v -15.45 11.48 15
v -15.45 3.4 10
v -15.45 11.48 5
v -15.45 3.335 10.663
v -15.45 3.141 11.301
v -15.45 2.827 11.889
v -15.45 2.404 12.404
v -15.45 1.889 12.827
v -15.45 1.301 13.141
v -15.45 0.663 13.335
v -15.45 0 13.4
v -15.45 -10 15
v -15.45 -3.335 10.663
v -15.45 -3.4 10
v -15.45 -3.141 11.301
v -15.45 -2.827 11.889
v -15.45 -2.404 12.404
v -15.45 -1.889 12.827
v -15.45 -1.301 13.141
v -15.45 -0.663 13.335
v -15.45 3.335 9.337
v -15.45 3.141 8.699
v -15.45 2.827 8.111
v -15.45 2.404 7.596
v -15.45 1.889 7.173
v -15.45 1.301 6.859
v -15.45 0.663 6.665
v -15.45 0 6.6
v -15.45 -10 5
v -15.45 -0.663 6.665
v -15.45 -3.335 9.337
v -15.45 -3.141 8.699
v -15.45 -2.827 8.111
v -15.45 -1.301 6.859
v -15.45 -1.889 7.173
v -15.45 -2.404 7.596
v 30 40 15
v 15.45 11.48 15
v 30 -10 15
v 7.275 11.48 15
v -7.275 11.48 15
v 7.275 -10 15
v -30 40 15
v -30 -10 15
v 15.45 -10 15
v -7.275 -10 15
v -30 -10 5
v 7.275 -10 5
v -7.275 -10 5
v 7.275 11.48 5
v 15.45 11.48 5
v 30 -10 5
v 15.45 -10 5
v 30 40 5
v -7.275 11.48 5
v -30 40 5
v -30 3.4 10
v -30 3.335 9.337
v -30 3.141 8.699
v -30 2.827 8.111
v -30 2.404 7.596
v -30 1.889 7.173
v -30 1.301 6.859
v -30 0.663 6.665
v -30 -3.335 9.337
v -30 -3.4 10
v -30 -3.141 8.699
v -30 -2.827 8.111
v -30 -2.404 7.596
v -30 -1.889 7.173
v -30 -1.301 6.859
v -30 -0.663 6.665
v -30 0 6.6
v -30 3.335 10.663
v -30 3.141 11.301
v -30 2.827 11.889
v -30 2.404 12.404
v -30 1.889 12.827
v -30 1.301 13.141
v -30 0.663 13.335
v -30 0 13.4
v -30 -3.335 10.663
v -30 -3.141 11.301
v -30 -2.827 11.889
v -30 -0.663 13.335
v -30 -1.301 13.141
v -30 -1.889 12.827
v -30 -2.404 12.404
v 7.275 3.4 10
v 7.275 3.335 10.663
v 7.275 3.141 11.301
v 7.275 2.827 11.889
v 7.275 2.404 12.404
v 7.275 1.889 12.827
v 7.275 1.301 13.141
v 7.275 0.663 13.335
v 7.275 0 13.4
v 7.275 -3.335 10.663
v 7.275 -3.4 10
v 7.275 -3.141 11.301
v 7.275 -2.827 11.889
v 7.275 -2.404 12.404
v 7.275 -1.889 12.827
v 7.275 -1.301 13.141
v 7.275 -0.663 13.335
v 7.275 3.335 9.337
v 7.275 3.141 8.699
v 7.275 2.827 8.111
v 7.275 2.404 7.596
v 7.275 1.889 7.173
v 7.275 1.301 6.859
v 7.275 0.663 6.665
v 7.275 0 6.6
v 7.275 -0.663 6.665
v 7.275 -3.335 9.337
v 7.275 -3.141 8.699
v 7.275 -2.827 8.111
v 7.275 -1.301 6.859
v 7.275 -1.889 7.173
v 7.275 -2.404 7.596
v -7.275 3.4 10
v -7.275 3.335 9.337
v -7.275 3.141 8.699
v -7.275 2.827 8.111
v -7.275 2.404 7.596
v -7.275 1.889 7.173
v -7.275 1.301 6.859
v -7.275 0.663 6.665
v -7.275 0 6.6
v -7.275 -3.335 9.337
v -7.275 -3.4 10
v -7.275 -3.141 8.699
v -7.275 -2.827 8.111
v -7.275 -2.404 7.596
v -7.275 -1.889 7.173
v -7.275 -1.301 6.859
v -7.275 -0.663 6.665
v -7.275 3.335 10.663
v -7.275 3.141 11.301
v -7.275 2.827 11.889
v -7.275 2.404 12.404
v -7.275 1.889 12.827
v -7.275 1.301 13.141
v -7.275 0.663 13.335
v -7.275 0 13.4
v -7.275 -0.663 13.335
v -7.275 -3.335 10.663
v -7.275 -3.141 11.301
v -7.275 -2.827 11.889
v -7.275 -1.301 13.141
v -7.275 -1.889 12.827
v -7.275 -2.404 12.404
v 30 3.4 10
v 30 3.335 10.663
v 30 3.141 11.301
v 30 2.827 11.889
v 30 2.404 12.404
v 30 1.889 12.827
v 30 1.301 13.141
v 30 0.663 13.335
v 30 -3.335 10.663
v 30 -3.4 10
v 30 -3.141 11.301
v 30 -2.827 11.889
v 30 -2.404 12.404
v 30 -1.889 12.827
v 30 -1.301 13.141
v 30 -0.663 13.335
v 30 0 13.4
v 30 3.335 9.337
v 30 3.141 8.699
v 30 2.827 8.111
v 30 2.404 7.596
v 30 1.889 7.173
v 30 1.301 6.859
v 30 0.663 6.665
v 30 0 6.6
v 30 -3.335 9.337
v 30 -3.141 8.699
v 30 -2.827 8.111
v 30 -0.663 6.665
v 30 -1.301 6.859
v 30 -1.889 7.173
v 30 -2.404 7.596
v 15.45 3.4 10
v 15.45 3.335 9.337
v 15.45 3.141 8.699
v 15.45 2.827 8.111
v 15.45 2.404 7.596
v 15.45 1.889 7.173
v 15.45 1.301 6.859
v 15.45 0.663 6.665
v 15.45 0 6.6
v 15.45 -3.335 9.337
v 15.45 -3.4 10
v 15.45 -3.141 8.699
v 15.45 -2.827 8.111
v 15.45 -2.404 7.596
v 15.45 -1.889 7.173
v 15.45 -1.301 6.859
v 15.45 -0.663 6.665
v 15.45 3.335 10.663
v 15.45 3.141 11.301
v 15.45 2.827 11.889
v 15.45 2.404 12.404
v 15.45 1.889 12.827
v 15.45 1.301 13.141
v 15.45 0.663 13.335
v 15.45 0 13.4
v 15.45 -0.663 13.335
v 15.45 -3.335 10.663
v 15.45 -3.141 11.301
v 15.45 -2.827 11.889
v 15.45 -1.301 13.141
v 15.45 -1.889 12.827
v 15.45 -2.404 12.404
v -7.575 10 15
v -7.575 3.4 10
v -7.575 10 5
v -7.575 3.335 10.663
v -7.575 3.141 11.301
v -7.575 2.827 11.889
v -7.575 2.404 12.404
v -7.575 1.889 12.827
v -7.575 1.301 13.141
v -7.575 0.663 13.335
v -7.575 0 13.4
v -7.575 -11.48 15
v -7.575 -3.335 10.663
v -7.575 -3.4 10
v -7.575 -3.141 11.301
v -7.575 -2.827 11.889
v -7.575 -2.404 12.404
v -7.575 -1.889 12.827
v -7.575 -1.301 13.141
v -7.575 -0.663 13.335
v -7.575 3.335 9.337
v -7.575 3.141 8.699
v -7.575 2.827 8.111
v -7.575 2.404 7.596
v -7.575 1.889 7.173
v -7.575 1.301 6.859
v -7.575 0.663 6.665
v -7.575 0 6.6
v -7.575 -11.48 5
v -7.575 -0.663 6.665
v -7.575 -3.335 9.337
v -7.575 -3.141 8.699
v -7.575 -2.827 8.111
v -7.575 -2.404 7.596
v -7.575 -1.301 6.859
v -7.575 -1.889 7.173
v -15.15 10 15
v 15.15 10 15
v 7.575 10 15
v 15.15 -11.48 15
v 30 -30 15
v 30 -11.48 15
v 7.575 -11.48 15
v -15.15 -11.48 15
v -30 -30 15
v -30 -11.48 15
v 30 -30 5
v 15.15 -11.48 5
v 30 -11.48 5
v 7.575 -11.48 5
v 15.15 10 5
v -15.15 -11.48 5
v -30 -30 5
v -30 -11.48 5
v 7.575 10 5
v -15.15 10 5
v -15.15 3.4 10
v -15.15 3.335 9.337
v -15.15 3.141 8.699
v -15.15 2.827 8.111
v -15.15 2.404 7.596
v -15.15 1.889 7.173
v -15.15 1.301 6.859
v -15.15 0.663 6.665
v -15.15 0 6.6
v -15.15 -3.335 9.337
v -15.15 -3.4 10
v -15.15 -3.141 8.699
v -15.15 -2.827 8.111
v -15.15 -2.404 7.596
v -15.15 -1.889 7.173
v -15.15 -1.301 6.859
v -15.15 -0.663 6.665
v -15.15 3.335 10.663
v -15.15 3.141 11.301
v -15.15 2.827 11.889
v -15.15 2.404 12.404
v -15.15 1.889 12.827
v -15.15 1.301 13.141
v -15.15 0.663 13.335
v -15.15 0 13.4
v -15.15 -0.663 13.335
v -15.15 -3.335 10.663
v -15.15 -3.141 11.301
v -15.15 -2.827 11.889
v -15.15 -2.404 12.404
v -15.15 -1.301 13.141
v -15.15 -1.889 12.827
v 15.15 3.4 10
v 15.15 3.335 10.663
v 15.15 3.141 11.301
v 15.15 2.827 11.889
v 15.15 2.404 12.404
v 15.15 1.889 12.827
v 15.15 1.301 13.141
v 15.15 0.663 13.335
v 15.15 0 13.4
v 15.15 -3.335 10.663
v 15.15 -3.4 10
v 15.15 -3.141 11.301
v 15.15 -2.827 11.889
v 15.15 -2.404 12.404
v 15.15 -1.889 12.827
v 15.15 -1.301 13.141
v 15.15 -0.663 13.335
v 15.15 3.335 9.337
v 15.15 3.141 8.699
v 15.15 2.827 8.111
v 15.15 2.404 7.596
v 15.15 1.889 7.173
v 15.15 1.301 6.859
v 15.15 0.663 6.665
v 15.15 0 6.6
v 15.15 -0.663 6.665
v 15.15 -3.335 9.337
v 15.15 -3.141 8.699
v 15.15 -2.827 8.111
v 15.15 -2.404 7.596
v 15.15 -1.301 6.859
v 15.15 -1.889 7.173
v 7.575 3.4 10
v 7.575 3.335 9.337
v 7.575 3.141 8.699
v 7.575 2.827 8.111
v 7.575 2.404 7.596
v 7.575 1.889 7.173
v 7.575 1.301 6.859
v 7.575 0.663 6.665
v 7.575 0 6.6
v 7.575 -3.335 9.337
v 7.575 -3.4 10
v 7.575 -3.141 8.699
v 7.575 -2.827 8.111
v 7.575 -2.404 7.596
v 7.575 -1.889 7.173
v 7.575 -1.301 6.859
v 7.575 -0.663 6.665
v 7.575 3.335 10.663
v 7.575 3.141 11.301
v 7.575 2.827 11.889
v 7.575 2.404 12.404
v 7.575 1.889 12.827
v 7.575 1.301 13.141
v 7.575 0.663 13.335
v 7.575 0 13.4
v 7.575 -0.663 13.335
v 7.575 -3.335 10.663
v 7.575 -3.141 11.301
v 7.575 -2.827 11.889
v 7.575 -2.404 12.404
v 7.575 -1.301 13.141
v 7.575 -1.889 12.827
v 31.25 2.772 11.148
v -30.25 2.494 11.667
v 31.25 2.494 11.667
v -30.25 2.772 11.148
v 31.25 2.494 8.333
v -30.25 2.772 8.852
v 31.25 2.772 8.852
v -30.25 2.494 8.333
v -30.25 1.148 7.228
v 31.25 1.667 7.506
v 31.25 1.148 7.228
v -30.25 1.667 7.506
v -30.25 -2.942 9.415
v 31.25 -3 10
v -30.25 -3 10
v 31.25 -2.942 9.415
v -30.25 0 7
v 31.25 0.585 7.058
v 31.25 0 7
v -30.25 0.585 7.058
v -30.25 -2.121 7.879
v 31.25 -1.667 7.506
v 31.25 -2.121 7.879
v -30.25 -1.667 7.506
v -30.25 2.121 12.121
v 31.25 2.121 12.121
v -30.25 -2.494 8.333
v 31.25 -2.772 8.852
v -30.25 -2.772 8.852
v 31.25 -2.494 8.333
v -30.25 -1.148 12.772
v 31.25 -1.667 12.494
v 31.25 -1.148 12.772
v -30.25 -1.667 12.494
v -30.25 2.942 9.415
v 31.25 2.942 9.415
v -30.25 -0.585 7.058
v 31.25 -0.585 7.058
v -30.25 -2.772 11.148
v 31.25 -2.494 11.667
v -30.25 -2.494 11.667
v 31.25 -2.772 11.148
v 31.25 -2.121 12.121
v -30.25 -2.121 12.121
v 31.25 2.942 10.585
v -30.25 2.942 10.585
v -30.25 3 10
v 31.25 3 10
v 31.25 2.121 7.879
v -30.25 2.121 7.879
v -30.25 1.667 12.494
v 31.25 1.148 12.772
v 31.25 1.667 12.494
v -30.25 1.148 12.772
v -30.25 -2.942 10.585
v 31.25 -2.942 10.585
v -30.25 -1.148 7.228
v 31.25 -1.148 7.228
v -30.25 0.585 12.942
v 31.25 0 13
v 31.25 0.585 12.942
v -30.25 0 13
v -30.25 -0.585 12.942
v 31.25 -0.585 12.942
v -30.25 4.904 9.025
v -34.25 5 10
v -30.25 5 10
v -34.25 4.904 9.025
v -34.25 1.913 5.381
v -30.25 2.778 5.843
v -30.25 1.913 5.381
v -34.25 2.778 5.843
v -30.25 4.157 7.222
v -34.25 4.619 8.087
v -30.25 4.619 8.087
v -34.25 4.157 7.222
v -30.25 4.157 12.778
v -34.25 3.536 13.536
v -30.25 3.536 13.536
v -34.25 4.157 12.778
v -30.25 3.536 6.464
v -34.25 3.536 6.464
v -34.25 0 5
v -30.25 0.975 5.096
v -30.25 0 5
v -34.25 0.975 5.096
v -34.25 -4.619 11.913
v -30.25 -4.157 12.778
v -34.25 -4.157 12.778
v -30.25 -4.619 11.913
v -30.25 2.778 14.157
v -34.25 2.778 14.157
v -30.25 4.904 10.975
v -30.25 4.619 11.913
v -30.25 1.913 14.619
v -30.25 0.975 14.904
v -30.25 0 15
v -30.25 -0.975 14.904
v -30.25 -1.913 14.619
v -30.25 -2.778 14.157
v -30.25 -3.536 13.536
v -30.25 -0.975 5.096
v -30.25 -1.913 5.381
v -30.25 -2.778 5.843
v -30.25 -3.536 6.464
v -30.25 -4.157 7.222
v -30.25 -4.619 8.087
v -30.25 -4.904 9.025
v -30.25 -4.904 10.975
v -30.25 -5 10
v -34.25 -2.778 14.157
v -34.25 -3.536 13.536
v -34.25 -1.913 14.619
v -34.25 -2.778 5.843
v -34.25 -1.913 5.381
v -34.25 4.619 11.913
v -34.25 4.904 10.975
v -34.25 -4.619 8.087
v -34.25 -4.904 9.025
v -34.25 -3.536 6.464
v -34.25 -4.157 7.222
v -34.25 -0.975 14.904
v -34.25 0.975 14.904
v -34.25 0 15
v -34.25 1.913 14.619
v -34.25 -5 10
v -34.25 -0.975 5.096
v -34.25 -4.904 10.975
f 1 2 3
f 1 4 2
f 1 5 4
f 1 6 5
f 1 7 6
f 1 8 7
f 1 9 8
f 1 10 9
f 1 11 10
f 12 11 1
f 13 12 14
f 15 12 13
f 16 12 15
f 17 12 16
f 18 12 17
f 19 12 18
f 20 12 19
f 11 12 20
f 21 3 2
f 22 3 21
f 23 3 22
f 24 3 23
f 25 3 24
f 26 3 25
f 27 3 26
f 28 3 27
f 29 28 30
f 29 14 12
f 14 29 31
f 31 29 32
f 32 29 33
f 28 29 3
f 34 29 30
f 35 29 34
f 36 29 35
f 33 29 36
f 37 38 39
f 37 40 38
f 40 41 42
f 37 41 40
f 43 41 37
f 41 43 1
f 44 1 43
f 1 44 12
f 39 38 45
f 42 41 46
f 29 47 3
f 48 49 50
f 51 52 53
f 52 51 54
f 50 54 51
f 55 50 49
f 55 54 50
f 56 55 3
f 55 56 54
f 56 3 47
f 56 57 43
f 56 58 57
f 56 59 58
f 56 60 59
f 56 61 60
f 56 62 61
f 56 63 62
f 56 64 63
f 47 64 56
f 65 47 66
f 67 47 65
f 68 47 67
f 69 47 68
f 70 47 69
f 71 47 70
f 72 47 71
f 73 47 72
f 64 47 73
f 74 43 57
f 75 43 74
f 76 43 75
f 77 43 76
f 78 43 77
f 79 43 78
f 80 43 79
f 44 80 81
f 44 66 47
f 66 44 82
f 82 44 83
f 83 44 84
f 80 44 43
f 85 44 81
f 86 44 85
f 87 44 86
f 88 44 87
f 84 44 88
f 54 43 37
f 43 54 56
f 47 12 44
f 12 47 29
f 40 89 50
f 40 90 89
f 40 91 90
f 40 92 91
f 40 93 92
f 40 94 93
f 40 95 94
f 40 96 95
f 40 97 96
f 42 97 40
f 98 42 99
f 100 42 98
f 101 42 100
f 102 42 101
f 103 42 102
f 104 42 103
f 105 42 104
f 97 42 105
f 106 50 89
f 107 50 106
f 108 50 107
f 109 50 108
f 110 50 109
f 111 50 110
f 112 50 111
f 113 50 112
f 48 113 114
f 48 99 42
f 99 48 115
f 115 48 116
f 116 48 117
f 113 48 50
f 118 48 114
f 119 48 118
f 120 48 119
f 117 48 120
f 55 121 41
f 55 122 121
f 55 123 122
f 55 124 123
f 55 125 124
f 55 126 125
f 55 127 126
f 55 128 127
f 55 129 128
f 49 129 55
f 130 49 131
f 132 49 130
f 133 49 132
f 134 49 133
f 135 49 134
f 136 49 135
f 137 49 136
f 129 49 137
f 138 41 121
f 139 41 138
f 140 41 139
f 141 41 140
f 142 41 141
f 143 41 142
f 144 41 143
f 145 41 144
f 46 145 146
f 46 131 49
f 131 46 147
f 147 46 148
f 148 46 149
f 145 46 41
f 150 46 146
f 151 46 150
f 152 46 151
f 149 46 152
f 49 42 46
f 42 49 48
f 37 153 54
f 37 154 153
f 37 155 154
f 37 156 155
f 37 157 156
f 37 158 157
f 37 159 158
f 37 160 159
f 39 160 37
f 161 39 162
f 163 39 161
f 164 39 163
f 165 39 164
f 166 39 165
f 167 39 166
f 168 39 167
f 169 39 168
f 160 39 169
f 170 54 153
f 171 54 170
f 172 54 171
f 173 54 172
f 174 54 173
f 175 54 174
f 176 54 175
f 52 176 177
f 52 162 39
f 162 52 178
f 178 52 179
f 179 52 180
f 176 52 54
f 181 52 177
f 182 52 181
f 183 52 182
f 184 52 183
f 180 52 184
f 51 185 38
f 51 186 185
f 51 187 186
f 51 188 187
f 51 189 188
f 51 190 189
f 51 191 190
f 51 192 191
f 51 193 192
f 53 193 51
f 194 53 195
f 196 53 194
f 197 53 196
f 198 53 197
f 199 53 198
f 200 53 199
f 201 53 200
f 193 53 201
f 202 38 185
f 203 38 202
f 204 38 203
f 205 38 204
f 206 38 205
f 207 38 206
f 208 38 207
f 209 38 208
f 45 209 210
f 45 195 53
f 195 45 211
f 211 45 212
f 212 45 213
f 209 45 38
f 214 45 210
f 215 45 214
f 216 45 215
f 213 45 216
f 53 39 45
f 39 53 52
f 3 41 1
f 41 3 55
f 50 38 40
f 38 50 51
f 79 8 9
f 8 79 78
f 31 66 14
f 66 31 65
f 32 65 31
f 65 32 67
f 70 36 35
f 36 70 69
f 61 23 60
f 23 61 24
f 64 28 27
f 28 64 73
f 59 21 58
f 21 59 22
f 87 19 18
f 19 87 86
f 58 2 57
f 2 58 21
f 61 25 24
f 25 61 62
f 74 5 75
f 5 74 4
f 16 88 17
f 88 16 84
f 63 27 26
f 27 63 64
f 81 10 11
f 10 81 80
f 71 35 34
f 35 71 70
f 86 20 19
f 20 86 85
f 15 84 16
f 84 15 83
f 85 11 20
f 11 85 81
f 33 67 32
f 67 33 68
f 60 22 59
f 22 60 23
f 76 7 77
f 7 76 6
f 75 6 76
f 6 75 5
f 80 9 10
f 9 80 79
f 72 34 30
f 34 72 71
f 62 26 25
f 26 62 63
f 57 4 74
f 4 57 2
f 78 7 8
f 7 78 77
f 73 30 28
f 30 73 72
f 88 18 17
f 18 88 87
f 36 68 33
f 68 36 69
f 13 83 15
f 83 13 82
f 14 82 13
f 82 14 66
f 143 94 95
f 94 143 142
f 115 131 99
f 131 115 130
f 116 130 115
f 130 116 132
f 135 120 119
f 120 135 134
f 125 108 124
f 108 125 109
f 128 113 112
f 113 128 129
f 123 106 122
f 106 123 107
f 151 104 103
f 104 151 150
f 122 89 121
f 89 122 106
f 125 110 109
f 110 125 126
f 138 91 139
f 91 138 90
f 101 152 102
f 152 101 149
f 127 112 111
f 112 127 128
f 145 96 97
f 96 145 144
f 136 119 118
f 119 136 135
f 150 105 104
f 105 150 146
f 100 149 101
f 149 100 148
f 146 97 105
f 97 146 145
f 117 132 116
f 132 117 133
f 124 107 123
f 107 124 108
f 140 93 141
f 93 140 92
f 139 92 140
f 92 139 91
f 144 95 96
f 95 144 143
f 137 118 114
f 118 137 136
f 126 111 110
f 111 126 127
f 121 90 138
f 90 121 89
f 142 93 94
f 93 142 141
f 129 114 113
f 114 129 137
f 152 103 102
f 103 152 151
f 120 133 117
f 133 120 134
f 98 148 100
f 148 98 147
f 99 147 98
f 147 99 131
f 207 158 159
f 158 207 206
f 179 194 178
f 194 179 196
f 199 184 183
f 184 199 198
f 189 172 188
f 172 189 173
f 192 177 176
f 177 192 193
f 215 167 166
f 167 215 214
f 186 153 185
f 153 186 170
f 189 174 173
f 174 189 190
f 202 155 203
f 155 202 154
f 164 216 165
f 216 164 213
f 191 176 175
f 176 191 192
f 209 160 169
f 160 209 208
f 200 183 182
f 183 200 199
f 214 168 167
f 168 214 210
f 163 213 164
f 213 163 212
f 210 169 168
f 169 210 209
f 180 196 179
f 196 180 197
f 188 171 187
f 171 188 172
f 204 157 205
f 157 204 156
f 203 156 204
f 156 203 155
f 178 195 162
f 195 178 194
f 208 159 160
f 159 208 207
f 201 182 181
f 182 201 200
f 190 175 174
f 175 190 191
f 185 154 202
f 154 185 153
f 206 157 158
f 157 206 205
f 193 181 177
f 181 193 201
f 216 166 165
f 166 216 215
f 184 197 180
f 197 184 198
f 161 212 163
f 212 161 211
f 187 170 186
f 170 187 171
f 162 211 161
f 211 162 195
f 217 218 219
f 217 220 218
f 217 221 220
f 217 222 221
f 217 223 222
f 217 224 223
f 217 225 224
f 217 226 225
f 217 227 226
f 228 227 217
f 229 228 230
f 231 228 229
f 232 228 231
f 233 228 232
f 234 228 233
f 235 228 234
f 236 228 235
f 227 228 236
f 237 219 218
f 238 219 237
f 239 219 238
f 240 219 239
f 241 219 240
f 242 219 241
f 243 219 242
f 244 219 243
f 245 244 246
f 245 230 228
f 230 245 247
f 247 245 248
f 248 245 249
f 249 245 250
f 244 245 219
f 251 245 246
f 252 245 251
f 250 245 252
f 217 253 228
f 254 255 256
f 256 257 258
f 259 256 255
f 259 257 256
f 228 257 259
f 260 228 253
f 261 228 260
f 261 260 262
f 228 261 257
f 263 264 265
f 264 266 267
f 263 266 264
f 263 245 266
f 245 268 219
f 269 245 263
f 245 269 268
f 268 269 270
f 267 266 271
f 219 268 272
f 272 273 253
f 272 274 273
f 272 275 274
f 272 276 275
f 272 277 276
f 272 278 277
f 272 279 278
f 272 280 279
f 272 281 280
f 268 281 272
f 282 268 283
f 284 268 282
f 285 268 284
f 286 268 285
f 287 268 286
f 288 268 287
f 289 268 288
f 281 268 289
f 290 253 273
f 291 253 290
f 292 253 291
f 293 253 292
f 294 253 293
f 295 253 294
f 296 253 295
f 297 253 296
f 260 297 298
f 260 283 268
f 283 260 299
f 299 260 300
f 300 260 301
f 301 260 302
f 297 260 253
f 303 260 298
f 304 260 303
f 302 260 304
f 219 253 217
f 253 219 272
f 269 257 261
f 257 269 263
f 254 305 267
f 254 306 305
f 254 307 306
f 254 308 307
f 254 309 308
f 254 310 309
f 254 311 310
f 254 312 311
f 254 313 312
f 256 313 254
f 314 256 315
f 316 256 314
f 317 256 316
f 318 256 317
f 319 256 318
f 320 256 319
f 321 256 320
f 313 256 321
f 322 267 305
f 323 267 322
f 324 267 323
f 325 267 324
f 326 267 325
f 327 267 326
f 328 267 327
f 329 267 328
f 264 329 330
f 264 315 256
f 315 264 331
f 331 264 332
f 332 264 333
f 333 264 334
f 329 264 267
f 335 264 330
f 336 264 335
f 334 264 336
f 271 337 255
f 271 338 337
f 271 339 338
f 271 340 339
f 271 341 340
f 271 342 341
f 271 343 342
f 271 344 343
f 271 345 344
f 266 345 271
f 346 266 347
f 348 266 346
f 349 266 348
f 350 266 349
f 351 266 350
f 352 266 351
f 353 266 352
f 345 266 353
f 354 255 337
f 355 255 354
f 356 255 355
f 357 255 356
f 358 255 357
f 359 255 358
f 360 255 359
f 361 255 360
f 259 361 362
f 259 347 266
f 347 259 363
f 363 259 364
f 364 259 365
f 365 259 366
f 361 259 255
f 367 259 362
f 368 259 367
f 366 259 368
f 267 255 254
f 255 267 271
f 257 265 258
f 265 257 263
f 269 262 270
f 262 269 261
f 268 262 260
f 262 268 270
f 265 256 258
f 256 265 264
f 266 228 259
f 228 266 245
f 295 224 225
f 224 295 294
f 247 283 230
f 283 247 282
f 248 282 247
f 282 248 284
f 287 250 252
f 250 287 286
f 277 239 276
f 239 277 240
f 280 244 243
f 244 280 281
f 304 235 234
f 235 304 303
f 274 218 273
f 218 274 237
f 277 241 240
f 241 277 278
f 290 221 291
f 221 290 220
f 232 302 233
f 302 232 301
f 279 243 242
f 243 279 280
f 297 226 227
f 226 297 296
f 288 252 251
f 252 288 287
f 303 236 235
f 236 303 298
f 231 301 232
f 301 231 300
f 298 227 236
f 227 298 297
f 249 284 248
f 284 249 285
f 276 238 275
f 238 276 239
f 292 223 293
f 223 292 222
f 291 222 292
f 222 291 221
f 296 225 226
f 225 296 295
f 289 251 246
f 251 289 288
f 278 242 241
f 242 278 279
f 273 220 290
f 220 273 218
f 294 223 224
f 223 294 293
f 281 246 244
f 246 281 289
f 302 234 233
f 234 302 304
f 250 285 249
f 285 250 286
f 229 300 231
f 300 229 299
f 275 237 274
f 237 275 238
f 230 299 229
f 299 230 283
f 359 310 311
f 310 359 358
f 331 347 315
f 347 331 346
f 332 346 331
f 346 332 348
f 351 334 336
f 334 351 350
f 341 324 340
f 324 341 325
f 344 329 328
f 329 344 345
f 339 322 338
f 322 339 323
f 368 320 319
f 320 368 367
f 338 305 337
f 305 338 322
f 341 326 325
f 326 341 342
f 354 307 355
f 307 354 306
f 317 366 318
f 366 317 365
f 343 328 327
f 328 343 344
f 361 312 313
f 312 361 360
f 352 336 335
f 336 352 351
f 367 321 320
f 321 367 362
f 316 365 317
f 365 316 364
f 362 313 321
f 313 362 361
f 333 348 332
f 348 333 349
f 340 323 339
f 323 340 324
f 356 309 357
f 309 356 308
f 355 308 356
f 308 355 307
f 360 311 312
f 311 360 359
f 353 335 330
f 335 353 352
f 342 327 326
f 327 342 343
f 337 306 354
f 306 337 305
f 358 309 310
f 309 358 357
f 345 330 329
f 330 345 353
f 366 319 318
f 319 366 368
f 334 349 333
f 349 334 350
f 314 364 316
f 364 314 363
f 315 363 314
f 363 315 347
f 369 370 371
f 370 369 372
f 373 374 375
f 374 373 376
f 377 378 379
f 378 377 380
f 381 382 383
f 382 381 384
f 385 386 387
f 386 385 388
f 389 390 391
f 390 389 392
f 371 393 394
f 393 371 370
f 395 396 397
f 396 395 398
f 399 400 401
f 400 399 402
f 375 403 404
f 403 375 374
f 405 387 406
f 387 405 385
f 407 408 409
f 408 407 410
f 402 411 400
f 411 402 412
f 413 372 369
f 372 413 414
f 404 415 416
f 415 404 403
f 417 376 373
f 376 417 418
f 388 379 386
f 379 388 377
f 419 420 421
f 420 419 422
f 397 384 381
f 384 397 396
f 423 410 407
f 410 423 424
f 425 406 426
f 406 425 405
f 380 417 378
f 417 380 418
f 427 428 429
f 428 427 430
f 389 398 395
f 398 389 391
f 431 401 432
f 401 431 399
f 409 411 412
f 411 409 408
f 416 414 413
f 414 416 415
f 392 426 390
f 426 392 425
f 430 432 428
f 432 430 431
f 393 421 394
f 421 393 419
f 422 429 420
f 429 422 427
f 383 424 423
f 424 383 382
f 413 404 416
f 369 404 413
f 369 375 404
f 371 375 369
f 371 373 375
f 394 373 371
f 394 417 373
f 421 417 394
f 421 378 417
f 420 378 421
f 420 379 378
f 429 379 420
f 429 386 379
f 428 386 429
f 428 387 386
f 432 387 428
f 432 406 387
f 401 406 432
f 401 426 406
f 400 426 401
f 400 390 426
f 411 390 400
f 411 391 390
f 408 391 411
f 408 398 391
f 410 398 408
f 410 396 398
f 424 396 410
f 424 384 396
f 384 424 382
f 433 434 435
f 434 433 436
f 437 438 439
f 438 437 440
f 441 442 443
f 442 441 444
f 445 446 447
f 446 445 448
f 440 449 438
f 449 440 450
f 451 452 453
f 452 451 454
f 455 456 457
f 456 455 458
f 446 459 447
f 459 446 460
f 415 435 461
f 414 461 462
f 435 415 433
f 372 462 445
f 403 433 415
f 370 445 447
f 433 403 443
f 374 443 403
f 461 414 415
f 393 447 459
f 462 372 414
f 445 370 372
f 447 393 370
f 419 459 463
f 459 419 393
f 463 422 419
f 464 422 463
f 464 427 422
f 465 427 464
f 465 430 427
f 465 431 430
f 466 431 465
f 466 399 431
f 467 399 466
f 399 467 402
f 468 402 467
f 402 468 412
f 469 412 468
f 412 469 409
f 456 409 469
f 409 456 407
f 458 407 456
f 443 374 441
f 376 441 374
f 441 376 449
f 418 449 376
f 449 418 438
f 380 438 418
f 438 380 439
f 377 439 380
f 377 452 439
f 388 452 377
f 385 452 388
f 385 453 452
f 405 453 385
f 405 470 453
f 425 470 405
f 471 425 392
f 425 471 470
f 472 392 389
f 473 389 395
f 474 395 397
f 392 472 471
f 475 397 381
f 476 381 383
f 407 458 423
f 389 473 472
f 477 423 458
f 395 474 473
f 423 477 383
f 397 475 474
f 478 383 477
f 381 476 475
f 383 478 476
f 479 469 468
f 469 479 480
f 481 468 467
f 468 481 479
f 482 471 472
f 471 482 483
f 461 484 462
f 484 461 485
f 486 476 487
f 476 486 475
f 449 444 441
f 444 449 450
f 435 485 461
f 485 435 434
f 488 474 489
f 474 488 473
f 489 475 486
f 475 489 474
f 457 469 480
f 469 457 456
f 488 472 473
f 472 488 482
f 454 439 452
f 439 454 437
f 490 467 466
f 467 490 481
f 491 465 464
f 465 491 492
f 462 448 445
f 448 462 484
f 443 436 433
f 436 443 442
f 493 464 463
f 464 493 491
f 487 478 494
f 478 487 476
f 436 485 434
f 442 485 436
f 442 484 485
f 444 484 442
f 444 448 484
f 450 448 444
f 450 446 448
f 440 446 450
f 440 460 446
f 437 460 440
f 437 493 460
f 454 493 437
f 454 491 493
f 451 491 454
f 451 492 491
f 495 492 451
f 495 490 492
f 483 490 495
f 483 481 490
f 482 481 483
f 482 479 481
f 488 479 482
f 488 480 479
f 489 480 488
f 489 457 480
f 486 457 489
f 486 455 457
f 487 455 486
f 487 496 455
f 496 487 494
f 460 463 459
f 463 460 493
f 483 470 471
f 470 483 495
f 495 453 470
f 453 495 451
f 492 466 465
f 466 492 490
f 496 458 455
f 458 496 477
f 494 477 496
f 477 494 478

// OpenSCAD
$fn = 32;

// ------------------------------------------------------------------------
// Butt hinge: hinge 60 mm, leaf swung 0 deg
// Every part is its own module, assembly() places every instance.
// ------------------------------------------------------------------------

// --- part 1 ---
module hinge_base() {
  difference() {
    union() {
      translate([-30, -10, -5]) cube([14.55, 50, 10]);
      translate([-7.275, -10, -5]) cube([14.55, 50, 10]);
      translate([15.45, -10, -5]) cube([14.55, 50, 10]);
      translate([-30, 11.48, -5]) cube([60, 28.52, 10]);
    }
    translate([-22.725, 0, 0]) rotate([0, 90, 0]) cylinder(h = 16.55, d = 6.8, center = true);
    translate([0, 0, 0]) rotate([0, 90, 0]) cylinder(h = 16.55, d = 6.8, center = true);
    translate([22.725, 0, 0]) rotate([0, 90, 0]) cylinder(h = 16.55, d = 6.8, center = true);
  }
}

// --- part 2 ---
module hinge_mover() {
  difference() {
    union() {
      translate([-15.15, -30, -5]) cube([7.575, 40, 10]);
      translate([7.575, -30, -5]) cube([7.575, 40, 10]);
      translate([-30, -30, -5]) cube([60, 18.52, 10]);
    }
    translate([-11.362, 0, 0]) rotate([0, 90, 0]) cylinder(h = 9.575, d = 6.8, center = true);
    translate([11.362, 0, 0]) rotate([0, 90, 0]) cylinder(h = 9.575, d = 6.8, center = true);
  }
}

// --- part 3 ---
module hinge_pin() {
  rotate([0, 90, 0]) cylinder(h = 62.5, d = 6, center = true);
  translate([-34.25, 0, 0]) rotate([0, 90, 0]) cylinder(h = 4, d = 10);
}

// --- assembly ---
module assembly() {
  color([0.80, 0.24, 0.20]) translate([0, 0, 10]) rotate([0, 0, 0]) hinge_base();
  color([0.20, 0.45, 0.75]) translate([0, 0, 10]) rotate([0, 0, 0]) hinge_mover();
  color([0.25, 0.62, 0.32]) translate([0, 0, 10]) rotate([0, 0, 0]) hinge_pin();
}

assembly();
